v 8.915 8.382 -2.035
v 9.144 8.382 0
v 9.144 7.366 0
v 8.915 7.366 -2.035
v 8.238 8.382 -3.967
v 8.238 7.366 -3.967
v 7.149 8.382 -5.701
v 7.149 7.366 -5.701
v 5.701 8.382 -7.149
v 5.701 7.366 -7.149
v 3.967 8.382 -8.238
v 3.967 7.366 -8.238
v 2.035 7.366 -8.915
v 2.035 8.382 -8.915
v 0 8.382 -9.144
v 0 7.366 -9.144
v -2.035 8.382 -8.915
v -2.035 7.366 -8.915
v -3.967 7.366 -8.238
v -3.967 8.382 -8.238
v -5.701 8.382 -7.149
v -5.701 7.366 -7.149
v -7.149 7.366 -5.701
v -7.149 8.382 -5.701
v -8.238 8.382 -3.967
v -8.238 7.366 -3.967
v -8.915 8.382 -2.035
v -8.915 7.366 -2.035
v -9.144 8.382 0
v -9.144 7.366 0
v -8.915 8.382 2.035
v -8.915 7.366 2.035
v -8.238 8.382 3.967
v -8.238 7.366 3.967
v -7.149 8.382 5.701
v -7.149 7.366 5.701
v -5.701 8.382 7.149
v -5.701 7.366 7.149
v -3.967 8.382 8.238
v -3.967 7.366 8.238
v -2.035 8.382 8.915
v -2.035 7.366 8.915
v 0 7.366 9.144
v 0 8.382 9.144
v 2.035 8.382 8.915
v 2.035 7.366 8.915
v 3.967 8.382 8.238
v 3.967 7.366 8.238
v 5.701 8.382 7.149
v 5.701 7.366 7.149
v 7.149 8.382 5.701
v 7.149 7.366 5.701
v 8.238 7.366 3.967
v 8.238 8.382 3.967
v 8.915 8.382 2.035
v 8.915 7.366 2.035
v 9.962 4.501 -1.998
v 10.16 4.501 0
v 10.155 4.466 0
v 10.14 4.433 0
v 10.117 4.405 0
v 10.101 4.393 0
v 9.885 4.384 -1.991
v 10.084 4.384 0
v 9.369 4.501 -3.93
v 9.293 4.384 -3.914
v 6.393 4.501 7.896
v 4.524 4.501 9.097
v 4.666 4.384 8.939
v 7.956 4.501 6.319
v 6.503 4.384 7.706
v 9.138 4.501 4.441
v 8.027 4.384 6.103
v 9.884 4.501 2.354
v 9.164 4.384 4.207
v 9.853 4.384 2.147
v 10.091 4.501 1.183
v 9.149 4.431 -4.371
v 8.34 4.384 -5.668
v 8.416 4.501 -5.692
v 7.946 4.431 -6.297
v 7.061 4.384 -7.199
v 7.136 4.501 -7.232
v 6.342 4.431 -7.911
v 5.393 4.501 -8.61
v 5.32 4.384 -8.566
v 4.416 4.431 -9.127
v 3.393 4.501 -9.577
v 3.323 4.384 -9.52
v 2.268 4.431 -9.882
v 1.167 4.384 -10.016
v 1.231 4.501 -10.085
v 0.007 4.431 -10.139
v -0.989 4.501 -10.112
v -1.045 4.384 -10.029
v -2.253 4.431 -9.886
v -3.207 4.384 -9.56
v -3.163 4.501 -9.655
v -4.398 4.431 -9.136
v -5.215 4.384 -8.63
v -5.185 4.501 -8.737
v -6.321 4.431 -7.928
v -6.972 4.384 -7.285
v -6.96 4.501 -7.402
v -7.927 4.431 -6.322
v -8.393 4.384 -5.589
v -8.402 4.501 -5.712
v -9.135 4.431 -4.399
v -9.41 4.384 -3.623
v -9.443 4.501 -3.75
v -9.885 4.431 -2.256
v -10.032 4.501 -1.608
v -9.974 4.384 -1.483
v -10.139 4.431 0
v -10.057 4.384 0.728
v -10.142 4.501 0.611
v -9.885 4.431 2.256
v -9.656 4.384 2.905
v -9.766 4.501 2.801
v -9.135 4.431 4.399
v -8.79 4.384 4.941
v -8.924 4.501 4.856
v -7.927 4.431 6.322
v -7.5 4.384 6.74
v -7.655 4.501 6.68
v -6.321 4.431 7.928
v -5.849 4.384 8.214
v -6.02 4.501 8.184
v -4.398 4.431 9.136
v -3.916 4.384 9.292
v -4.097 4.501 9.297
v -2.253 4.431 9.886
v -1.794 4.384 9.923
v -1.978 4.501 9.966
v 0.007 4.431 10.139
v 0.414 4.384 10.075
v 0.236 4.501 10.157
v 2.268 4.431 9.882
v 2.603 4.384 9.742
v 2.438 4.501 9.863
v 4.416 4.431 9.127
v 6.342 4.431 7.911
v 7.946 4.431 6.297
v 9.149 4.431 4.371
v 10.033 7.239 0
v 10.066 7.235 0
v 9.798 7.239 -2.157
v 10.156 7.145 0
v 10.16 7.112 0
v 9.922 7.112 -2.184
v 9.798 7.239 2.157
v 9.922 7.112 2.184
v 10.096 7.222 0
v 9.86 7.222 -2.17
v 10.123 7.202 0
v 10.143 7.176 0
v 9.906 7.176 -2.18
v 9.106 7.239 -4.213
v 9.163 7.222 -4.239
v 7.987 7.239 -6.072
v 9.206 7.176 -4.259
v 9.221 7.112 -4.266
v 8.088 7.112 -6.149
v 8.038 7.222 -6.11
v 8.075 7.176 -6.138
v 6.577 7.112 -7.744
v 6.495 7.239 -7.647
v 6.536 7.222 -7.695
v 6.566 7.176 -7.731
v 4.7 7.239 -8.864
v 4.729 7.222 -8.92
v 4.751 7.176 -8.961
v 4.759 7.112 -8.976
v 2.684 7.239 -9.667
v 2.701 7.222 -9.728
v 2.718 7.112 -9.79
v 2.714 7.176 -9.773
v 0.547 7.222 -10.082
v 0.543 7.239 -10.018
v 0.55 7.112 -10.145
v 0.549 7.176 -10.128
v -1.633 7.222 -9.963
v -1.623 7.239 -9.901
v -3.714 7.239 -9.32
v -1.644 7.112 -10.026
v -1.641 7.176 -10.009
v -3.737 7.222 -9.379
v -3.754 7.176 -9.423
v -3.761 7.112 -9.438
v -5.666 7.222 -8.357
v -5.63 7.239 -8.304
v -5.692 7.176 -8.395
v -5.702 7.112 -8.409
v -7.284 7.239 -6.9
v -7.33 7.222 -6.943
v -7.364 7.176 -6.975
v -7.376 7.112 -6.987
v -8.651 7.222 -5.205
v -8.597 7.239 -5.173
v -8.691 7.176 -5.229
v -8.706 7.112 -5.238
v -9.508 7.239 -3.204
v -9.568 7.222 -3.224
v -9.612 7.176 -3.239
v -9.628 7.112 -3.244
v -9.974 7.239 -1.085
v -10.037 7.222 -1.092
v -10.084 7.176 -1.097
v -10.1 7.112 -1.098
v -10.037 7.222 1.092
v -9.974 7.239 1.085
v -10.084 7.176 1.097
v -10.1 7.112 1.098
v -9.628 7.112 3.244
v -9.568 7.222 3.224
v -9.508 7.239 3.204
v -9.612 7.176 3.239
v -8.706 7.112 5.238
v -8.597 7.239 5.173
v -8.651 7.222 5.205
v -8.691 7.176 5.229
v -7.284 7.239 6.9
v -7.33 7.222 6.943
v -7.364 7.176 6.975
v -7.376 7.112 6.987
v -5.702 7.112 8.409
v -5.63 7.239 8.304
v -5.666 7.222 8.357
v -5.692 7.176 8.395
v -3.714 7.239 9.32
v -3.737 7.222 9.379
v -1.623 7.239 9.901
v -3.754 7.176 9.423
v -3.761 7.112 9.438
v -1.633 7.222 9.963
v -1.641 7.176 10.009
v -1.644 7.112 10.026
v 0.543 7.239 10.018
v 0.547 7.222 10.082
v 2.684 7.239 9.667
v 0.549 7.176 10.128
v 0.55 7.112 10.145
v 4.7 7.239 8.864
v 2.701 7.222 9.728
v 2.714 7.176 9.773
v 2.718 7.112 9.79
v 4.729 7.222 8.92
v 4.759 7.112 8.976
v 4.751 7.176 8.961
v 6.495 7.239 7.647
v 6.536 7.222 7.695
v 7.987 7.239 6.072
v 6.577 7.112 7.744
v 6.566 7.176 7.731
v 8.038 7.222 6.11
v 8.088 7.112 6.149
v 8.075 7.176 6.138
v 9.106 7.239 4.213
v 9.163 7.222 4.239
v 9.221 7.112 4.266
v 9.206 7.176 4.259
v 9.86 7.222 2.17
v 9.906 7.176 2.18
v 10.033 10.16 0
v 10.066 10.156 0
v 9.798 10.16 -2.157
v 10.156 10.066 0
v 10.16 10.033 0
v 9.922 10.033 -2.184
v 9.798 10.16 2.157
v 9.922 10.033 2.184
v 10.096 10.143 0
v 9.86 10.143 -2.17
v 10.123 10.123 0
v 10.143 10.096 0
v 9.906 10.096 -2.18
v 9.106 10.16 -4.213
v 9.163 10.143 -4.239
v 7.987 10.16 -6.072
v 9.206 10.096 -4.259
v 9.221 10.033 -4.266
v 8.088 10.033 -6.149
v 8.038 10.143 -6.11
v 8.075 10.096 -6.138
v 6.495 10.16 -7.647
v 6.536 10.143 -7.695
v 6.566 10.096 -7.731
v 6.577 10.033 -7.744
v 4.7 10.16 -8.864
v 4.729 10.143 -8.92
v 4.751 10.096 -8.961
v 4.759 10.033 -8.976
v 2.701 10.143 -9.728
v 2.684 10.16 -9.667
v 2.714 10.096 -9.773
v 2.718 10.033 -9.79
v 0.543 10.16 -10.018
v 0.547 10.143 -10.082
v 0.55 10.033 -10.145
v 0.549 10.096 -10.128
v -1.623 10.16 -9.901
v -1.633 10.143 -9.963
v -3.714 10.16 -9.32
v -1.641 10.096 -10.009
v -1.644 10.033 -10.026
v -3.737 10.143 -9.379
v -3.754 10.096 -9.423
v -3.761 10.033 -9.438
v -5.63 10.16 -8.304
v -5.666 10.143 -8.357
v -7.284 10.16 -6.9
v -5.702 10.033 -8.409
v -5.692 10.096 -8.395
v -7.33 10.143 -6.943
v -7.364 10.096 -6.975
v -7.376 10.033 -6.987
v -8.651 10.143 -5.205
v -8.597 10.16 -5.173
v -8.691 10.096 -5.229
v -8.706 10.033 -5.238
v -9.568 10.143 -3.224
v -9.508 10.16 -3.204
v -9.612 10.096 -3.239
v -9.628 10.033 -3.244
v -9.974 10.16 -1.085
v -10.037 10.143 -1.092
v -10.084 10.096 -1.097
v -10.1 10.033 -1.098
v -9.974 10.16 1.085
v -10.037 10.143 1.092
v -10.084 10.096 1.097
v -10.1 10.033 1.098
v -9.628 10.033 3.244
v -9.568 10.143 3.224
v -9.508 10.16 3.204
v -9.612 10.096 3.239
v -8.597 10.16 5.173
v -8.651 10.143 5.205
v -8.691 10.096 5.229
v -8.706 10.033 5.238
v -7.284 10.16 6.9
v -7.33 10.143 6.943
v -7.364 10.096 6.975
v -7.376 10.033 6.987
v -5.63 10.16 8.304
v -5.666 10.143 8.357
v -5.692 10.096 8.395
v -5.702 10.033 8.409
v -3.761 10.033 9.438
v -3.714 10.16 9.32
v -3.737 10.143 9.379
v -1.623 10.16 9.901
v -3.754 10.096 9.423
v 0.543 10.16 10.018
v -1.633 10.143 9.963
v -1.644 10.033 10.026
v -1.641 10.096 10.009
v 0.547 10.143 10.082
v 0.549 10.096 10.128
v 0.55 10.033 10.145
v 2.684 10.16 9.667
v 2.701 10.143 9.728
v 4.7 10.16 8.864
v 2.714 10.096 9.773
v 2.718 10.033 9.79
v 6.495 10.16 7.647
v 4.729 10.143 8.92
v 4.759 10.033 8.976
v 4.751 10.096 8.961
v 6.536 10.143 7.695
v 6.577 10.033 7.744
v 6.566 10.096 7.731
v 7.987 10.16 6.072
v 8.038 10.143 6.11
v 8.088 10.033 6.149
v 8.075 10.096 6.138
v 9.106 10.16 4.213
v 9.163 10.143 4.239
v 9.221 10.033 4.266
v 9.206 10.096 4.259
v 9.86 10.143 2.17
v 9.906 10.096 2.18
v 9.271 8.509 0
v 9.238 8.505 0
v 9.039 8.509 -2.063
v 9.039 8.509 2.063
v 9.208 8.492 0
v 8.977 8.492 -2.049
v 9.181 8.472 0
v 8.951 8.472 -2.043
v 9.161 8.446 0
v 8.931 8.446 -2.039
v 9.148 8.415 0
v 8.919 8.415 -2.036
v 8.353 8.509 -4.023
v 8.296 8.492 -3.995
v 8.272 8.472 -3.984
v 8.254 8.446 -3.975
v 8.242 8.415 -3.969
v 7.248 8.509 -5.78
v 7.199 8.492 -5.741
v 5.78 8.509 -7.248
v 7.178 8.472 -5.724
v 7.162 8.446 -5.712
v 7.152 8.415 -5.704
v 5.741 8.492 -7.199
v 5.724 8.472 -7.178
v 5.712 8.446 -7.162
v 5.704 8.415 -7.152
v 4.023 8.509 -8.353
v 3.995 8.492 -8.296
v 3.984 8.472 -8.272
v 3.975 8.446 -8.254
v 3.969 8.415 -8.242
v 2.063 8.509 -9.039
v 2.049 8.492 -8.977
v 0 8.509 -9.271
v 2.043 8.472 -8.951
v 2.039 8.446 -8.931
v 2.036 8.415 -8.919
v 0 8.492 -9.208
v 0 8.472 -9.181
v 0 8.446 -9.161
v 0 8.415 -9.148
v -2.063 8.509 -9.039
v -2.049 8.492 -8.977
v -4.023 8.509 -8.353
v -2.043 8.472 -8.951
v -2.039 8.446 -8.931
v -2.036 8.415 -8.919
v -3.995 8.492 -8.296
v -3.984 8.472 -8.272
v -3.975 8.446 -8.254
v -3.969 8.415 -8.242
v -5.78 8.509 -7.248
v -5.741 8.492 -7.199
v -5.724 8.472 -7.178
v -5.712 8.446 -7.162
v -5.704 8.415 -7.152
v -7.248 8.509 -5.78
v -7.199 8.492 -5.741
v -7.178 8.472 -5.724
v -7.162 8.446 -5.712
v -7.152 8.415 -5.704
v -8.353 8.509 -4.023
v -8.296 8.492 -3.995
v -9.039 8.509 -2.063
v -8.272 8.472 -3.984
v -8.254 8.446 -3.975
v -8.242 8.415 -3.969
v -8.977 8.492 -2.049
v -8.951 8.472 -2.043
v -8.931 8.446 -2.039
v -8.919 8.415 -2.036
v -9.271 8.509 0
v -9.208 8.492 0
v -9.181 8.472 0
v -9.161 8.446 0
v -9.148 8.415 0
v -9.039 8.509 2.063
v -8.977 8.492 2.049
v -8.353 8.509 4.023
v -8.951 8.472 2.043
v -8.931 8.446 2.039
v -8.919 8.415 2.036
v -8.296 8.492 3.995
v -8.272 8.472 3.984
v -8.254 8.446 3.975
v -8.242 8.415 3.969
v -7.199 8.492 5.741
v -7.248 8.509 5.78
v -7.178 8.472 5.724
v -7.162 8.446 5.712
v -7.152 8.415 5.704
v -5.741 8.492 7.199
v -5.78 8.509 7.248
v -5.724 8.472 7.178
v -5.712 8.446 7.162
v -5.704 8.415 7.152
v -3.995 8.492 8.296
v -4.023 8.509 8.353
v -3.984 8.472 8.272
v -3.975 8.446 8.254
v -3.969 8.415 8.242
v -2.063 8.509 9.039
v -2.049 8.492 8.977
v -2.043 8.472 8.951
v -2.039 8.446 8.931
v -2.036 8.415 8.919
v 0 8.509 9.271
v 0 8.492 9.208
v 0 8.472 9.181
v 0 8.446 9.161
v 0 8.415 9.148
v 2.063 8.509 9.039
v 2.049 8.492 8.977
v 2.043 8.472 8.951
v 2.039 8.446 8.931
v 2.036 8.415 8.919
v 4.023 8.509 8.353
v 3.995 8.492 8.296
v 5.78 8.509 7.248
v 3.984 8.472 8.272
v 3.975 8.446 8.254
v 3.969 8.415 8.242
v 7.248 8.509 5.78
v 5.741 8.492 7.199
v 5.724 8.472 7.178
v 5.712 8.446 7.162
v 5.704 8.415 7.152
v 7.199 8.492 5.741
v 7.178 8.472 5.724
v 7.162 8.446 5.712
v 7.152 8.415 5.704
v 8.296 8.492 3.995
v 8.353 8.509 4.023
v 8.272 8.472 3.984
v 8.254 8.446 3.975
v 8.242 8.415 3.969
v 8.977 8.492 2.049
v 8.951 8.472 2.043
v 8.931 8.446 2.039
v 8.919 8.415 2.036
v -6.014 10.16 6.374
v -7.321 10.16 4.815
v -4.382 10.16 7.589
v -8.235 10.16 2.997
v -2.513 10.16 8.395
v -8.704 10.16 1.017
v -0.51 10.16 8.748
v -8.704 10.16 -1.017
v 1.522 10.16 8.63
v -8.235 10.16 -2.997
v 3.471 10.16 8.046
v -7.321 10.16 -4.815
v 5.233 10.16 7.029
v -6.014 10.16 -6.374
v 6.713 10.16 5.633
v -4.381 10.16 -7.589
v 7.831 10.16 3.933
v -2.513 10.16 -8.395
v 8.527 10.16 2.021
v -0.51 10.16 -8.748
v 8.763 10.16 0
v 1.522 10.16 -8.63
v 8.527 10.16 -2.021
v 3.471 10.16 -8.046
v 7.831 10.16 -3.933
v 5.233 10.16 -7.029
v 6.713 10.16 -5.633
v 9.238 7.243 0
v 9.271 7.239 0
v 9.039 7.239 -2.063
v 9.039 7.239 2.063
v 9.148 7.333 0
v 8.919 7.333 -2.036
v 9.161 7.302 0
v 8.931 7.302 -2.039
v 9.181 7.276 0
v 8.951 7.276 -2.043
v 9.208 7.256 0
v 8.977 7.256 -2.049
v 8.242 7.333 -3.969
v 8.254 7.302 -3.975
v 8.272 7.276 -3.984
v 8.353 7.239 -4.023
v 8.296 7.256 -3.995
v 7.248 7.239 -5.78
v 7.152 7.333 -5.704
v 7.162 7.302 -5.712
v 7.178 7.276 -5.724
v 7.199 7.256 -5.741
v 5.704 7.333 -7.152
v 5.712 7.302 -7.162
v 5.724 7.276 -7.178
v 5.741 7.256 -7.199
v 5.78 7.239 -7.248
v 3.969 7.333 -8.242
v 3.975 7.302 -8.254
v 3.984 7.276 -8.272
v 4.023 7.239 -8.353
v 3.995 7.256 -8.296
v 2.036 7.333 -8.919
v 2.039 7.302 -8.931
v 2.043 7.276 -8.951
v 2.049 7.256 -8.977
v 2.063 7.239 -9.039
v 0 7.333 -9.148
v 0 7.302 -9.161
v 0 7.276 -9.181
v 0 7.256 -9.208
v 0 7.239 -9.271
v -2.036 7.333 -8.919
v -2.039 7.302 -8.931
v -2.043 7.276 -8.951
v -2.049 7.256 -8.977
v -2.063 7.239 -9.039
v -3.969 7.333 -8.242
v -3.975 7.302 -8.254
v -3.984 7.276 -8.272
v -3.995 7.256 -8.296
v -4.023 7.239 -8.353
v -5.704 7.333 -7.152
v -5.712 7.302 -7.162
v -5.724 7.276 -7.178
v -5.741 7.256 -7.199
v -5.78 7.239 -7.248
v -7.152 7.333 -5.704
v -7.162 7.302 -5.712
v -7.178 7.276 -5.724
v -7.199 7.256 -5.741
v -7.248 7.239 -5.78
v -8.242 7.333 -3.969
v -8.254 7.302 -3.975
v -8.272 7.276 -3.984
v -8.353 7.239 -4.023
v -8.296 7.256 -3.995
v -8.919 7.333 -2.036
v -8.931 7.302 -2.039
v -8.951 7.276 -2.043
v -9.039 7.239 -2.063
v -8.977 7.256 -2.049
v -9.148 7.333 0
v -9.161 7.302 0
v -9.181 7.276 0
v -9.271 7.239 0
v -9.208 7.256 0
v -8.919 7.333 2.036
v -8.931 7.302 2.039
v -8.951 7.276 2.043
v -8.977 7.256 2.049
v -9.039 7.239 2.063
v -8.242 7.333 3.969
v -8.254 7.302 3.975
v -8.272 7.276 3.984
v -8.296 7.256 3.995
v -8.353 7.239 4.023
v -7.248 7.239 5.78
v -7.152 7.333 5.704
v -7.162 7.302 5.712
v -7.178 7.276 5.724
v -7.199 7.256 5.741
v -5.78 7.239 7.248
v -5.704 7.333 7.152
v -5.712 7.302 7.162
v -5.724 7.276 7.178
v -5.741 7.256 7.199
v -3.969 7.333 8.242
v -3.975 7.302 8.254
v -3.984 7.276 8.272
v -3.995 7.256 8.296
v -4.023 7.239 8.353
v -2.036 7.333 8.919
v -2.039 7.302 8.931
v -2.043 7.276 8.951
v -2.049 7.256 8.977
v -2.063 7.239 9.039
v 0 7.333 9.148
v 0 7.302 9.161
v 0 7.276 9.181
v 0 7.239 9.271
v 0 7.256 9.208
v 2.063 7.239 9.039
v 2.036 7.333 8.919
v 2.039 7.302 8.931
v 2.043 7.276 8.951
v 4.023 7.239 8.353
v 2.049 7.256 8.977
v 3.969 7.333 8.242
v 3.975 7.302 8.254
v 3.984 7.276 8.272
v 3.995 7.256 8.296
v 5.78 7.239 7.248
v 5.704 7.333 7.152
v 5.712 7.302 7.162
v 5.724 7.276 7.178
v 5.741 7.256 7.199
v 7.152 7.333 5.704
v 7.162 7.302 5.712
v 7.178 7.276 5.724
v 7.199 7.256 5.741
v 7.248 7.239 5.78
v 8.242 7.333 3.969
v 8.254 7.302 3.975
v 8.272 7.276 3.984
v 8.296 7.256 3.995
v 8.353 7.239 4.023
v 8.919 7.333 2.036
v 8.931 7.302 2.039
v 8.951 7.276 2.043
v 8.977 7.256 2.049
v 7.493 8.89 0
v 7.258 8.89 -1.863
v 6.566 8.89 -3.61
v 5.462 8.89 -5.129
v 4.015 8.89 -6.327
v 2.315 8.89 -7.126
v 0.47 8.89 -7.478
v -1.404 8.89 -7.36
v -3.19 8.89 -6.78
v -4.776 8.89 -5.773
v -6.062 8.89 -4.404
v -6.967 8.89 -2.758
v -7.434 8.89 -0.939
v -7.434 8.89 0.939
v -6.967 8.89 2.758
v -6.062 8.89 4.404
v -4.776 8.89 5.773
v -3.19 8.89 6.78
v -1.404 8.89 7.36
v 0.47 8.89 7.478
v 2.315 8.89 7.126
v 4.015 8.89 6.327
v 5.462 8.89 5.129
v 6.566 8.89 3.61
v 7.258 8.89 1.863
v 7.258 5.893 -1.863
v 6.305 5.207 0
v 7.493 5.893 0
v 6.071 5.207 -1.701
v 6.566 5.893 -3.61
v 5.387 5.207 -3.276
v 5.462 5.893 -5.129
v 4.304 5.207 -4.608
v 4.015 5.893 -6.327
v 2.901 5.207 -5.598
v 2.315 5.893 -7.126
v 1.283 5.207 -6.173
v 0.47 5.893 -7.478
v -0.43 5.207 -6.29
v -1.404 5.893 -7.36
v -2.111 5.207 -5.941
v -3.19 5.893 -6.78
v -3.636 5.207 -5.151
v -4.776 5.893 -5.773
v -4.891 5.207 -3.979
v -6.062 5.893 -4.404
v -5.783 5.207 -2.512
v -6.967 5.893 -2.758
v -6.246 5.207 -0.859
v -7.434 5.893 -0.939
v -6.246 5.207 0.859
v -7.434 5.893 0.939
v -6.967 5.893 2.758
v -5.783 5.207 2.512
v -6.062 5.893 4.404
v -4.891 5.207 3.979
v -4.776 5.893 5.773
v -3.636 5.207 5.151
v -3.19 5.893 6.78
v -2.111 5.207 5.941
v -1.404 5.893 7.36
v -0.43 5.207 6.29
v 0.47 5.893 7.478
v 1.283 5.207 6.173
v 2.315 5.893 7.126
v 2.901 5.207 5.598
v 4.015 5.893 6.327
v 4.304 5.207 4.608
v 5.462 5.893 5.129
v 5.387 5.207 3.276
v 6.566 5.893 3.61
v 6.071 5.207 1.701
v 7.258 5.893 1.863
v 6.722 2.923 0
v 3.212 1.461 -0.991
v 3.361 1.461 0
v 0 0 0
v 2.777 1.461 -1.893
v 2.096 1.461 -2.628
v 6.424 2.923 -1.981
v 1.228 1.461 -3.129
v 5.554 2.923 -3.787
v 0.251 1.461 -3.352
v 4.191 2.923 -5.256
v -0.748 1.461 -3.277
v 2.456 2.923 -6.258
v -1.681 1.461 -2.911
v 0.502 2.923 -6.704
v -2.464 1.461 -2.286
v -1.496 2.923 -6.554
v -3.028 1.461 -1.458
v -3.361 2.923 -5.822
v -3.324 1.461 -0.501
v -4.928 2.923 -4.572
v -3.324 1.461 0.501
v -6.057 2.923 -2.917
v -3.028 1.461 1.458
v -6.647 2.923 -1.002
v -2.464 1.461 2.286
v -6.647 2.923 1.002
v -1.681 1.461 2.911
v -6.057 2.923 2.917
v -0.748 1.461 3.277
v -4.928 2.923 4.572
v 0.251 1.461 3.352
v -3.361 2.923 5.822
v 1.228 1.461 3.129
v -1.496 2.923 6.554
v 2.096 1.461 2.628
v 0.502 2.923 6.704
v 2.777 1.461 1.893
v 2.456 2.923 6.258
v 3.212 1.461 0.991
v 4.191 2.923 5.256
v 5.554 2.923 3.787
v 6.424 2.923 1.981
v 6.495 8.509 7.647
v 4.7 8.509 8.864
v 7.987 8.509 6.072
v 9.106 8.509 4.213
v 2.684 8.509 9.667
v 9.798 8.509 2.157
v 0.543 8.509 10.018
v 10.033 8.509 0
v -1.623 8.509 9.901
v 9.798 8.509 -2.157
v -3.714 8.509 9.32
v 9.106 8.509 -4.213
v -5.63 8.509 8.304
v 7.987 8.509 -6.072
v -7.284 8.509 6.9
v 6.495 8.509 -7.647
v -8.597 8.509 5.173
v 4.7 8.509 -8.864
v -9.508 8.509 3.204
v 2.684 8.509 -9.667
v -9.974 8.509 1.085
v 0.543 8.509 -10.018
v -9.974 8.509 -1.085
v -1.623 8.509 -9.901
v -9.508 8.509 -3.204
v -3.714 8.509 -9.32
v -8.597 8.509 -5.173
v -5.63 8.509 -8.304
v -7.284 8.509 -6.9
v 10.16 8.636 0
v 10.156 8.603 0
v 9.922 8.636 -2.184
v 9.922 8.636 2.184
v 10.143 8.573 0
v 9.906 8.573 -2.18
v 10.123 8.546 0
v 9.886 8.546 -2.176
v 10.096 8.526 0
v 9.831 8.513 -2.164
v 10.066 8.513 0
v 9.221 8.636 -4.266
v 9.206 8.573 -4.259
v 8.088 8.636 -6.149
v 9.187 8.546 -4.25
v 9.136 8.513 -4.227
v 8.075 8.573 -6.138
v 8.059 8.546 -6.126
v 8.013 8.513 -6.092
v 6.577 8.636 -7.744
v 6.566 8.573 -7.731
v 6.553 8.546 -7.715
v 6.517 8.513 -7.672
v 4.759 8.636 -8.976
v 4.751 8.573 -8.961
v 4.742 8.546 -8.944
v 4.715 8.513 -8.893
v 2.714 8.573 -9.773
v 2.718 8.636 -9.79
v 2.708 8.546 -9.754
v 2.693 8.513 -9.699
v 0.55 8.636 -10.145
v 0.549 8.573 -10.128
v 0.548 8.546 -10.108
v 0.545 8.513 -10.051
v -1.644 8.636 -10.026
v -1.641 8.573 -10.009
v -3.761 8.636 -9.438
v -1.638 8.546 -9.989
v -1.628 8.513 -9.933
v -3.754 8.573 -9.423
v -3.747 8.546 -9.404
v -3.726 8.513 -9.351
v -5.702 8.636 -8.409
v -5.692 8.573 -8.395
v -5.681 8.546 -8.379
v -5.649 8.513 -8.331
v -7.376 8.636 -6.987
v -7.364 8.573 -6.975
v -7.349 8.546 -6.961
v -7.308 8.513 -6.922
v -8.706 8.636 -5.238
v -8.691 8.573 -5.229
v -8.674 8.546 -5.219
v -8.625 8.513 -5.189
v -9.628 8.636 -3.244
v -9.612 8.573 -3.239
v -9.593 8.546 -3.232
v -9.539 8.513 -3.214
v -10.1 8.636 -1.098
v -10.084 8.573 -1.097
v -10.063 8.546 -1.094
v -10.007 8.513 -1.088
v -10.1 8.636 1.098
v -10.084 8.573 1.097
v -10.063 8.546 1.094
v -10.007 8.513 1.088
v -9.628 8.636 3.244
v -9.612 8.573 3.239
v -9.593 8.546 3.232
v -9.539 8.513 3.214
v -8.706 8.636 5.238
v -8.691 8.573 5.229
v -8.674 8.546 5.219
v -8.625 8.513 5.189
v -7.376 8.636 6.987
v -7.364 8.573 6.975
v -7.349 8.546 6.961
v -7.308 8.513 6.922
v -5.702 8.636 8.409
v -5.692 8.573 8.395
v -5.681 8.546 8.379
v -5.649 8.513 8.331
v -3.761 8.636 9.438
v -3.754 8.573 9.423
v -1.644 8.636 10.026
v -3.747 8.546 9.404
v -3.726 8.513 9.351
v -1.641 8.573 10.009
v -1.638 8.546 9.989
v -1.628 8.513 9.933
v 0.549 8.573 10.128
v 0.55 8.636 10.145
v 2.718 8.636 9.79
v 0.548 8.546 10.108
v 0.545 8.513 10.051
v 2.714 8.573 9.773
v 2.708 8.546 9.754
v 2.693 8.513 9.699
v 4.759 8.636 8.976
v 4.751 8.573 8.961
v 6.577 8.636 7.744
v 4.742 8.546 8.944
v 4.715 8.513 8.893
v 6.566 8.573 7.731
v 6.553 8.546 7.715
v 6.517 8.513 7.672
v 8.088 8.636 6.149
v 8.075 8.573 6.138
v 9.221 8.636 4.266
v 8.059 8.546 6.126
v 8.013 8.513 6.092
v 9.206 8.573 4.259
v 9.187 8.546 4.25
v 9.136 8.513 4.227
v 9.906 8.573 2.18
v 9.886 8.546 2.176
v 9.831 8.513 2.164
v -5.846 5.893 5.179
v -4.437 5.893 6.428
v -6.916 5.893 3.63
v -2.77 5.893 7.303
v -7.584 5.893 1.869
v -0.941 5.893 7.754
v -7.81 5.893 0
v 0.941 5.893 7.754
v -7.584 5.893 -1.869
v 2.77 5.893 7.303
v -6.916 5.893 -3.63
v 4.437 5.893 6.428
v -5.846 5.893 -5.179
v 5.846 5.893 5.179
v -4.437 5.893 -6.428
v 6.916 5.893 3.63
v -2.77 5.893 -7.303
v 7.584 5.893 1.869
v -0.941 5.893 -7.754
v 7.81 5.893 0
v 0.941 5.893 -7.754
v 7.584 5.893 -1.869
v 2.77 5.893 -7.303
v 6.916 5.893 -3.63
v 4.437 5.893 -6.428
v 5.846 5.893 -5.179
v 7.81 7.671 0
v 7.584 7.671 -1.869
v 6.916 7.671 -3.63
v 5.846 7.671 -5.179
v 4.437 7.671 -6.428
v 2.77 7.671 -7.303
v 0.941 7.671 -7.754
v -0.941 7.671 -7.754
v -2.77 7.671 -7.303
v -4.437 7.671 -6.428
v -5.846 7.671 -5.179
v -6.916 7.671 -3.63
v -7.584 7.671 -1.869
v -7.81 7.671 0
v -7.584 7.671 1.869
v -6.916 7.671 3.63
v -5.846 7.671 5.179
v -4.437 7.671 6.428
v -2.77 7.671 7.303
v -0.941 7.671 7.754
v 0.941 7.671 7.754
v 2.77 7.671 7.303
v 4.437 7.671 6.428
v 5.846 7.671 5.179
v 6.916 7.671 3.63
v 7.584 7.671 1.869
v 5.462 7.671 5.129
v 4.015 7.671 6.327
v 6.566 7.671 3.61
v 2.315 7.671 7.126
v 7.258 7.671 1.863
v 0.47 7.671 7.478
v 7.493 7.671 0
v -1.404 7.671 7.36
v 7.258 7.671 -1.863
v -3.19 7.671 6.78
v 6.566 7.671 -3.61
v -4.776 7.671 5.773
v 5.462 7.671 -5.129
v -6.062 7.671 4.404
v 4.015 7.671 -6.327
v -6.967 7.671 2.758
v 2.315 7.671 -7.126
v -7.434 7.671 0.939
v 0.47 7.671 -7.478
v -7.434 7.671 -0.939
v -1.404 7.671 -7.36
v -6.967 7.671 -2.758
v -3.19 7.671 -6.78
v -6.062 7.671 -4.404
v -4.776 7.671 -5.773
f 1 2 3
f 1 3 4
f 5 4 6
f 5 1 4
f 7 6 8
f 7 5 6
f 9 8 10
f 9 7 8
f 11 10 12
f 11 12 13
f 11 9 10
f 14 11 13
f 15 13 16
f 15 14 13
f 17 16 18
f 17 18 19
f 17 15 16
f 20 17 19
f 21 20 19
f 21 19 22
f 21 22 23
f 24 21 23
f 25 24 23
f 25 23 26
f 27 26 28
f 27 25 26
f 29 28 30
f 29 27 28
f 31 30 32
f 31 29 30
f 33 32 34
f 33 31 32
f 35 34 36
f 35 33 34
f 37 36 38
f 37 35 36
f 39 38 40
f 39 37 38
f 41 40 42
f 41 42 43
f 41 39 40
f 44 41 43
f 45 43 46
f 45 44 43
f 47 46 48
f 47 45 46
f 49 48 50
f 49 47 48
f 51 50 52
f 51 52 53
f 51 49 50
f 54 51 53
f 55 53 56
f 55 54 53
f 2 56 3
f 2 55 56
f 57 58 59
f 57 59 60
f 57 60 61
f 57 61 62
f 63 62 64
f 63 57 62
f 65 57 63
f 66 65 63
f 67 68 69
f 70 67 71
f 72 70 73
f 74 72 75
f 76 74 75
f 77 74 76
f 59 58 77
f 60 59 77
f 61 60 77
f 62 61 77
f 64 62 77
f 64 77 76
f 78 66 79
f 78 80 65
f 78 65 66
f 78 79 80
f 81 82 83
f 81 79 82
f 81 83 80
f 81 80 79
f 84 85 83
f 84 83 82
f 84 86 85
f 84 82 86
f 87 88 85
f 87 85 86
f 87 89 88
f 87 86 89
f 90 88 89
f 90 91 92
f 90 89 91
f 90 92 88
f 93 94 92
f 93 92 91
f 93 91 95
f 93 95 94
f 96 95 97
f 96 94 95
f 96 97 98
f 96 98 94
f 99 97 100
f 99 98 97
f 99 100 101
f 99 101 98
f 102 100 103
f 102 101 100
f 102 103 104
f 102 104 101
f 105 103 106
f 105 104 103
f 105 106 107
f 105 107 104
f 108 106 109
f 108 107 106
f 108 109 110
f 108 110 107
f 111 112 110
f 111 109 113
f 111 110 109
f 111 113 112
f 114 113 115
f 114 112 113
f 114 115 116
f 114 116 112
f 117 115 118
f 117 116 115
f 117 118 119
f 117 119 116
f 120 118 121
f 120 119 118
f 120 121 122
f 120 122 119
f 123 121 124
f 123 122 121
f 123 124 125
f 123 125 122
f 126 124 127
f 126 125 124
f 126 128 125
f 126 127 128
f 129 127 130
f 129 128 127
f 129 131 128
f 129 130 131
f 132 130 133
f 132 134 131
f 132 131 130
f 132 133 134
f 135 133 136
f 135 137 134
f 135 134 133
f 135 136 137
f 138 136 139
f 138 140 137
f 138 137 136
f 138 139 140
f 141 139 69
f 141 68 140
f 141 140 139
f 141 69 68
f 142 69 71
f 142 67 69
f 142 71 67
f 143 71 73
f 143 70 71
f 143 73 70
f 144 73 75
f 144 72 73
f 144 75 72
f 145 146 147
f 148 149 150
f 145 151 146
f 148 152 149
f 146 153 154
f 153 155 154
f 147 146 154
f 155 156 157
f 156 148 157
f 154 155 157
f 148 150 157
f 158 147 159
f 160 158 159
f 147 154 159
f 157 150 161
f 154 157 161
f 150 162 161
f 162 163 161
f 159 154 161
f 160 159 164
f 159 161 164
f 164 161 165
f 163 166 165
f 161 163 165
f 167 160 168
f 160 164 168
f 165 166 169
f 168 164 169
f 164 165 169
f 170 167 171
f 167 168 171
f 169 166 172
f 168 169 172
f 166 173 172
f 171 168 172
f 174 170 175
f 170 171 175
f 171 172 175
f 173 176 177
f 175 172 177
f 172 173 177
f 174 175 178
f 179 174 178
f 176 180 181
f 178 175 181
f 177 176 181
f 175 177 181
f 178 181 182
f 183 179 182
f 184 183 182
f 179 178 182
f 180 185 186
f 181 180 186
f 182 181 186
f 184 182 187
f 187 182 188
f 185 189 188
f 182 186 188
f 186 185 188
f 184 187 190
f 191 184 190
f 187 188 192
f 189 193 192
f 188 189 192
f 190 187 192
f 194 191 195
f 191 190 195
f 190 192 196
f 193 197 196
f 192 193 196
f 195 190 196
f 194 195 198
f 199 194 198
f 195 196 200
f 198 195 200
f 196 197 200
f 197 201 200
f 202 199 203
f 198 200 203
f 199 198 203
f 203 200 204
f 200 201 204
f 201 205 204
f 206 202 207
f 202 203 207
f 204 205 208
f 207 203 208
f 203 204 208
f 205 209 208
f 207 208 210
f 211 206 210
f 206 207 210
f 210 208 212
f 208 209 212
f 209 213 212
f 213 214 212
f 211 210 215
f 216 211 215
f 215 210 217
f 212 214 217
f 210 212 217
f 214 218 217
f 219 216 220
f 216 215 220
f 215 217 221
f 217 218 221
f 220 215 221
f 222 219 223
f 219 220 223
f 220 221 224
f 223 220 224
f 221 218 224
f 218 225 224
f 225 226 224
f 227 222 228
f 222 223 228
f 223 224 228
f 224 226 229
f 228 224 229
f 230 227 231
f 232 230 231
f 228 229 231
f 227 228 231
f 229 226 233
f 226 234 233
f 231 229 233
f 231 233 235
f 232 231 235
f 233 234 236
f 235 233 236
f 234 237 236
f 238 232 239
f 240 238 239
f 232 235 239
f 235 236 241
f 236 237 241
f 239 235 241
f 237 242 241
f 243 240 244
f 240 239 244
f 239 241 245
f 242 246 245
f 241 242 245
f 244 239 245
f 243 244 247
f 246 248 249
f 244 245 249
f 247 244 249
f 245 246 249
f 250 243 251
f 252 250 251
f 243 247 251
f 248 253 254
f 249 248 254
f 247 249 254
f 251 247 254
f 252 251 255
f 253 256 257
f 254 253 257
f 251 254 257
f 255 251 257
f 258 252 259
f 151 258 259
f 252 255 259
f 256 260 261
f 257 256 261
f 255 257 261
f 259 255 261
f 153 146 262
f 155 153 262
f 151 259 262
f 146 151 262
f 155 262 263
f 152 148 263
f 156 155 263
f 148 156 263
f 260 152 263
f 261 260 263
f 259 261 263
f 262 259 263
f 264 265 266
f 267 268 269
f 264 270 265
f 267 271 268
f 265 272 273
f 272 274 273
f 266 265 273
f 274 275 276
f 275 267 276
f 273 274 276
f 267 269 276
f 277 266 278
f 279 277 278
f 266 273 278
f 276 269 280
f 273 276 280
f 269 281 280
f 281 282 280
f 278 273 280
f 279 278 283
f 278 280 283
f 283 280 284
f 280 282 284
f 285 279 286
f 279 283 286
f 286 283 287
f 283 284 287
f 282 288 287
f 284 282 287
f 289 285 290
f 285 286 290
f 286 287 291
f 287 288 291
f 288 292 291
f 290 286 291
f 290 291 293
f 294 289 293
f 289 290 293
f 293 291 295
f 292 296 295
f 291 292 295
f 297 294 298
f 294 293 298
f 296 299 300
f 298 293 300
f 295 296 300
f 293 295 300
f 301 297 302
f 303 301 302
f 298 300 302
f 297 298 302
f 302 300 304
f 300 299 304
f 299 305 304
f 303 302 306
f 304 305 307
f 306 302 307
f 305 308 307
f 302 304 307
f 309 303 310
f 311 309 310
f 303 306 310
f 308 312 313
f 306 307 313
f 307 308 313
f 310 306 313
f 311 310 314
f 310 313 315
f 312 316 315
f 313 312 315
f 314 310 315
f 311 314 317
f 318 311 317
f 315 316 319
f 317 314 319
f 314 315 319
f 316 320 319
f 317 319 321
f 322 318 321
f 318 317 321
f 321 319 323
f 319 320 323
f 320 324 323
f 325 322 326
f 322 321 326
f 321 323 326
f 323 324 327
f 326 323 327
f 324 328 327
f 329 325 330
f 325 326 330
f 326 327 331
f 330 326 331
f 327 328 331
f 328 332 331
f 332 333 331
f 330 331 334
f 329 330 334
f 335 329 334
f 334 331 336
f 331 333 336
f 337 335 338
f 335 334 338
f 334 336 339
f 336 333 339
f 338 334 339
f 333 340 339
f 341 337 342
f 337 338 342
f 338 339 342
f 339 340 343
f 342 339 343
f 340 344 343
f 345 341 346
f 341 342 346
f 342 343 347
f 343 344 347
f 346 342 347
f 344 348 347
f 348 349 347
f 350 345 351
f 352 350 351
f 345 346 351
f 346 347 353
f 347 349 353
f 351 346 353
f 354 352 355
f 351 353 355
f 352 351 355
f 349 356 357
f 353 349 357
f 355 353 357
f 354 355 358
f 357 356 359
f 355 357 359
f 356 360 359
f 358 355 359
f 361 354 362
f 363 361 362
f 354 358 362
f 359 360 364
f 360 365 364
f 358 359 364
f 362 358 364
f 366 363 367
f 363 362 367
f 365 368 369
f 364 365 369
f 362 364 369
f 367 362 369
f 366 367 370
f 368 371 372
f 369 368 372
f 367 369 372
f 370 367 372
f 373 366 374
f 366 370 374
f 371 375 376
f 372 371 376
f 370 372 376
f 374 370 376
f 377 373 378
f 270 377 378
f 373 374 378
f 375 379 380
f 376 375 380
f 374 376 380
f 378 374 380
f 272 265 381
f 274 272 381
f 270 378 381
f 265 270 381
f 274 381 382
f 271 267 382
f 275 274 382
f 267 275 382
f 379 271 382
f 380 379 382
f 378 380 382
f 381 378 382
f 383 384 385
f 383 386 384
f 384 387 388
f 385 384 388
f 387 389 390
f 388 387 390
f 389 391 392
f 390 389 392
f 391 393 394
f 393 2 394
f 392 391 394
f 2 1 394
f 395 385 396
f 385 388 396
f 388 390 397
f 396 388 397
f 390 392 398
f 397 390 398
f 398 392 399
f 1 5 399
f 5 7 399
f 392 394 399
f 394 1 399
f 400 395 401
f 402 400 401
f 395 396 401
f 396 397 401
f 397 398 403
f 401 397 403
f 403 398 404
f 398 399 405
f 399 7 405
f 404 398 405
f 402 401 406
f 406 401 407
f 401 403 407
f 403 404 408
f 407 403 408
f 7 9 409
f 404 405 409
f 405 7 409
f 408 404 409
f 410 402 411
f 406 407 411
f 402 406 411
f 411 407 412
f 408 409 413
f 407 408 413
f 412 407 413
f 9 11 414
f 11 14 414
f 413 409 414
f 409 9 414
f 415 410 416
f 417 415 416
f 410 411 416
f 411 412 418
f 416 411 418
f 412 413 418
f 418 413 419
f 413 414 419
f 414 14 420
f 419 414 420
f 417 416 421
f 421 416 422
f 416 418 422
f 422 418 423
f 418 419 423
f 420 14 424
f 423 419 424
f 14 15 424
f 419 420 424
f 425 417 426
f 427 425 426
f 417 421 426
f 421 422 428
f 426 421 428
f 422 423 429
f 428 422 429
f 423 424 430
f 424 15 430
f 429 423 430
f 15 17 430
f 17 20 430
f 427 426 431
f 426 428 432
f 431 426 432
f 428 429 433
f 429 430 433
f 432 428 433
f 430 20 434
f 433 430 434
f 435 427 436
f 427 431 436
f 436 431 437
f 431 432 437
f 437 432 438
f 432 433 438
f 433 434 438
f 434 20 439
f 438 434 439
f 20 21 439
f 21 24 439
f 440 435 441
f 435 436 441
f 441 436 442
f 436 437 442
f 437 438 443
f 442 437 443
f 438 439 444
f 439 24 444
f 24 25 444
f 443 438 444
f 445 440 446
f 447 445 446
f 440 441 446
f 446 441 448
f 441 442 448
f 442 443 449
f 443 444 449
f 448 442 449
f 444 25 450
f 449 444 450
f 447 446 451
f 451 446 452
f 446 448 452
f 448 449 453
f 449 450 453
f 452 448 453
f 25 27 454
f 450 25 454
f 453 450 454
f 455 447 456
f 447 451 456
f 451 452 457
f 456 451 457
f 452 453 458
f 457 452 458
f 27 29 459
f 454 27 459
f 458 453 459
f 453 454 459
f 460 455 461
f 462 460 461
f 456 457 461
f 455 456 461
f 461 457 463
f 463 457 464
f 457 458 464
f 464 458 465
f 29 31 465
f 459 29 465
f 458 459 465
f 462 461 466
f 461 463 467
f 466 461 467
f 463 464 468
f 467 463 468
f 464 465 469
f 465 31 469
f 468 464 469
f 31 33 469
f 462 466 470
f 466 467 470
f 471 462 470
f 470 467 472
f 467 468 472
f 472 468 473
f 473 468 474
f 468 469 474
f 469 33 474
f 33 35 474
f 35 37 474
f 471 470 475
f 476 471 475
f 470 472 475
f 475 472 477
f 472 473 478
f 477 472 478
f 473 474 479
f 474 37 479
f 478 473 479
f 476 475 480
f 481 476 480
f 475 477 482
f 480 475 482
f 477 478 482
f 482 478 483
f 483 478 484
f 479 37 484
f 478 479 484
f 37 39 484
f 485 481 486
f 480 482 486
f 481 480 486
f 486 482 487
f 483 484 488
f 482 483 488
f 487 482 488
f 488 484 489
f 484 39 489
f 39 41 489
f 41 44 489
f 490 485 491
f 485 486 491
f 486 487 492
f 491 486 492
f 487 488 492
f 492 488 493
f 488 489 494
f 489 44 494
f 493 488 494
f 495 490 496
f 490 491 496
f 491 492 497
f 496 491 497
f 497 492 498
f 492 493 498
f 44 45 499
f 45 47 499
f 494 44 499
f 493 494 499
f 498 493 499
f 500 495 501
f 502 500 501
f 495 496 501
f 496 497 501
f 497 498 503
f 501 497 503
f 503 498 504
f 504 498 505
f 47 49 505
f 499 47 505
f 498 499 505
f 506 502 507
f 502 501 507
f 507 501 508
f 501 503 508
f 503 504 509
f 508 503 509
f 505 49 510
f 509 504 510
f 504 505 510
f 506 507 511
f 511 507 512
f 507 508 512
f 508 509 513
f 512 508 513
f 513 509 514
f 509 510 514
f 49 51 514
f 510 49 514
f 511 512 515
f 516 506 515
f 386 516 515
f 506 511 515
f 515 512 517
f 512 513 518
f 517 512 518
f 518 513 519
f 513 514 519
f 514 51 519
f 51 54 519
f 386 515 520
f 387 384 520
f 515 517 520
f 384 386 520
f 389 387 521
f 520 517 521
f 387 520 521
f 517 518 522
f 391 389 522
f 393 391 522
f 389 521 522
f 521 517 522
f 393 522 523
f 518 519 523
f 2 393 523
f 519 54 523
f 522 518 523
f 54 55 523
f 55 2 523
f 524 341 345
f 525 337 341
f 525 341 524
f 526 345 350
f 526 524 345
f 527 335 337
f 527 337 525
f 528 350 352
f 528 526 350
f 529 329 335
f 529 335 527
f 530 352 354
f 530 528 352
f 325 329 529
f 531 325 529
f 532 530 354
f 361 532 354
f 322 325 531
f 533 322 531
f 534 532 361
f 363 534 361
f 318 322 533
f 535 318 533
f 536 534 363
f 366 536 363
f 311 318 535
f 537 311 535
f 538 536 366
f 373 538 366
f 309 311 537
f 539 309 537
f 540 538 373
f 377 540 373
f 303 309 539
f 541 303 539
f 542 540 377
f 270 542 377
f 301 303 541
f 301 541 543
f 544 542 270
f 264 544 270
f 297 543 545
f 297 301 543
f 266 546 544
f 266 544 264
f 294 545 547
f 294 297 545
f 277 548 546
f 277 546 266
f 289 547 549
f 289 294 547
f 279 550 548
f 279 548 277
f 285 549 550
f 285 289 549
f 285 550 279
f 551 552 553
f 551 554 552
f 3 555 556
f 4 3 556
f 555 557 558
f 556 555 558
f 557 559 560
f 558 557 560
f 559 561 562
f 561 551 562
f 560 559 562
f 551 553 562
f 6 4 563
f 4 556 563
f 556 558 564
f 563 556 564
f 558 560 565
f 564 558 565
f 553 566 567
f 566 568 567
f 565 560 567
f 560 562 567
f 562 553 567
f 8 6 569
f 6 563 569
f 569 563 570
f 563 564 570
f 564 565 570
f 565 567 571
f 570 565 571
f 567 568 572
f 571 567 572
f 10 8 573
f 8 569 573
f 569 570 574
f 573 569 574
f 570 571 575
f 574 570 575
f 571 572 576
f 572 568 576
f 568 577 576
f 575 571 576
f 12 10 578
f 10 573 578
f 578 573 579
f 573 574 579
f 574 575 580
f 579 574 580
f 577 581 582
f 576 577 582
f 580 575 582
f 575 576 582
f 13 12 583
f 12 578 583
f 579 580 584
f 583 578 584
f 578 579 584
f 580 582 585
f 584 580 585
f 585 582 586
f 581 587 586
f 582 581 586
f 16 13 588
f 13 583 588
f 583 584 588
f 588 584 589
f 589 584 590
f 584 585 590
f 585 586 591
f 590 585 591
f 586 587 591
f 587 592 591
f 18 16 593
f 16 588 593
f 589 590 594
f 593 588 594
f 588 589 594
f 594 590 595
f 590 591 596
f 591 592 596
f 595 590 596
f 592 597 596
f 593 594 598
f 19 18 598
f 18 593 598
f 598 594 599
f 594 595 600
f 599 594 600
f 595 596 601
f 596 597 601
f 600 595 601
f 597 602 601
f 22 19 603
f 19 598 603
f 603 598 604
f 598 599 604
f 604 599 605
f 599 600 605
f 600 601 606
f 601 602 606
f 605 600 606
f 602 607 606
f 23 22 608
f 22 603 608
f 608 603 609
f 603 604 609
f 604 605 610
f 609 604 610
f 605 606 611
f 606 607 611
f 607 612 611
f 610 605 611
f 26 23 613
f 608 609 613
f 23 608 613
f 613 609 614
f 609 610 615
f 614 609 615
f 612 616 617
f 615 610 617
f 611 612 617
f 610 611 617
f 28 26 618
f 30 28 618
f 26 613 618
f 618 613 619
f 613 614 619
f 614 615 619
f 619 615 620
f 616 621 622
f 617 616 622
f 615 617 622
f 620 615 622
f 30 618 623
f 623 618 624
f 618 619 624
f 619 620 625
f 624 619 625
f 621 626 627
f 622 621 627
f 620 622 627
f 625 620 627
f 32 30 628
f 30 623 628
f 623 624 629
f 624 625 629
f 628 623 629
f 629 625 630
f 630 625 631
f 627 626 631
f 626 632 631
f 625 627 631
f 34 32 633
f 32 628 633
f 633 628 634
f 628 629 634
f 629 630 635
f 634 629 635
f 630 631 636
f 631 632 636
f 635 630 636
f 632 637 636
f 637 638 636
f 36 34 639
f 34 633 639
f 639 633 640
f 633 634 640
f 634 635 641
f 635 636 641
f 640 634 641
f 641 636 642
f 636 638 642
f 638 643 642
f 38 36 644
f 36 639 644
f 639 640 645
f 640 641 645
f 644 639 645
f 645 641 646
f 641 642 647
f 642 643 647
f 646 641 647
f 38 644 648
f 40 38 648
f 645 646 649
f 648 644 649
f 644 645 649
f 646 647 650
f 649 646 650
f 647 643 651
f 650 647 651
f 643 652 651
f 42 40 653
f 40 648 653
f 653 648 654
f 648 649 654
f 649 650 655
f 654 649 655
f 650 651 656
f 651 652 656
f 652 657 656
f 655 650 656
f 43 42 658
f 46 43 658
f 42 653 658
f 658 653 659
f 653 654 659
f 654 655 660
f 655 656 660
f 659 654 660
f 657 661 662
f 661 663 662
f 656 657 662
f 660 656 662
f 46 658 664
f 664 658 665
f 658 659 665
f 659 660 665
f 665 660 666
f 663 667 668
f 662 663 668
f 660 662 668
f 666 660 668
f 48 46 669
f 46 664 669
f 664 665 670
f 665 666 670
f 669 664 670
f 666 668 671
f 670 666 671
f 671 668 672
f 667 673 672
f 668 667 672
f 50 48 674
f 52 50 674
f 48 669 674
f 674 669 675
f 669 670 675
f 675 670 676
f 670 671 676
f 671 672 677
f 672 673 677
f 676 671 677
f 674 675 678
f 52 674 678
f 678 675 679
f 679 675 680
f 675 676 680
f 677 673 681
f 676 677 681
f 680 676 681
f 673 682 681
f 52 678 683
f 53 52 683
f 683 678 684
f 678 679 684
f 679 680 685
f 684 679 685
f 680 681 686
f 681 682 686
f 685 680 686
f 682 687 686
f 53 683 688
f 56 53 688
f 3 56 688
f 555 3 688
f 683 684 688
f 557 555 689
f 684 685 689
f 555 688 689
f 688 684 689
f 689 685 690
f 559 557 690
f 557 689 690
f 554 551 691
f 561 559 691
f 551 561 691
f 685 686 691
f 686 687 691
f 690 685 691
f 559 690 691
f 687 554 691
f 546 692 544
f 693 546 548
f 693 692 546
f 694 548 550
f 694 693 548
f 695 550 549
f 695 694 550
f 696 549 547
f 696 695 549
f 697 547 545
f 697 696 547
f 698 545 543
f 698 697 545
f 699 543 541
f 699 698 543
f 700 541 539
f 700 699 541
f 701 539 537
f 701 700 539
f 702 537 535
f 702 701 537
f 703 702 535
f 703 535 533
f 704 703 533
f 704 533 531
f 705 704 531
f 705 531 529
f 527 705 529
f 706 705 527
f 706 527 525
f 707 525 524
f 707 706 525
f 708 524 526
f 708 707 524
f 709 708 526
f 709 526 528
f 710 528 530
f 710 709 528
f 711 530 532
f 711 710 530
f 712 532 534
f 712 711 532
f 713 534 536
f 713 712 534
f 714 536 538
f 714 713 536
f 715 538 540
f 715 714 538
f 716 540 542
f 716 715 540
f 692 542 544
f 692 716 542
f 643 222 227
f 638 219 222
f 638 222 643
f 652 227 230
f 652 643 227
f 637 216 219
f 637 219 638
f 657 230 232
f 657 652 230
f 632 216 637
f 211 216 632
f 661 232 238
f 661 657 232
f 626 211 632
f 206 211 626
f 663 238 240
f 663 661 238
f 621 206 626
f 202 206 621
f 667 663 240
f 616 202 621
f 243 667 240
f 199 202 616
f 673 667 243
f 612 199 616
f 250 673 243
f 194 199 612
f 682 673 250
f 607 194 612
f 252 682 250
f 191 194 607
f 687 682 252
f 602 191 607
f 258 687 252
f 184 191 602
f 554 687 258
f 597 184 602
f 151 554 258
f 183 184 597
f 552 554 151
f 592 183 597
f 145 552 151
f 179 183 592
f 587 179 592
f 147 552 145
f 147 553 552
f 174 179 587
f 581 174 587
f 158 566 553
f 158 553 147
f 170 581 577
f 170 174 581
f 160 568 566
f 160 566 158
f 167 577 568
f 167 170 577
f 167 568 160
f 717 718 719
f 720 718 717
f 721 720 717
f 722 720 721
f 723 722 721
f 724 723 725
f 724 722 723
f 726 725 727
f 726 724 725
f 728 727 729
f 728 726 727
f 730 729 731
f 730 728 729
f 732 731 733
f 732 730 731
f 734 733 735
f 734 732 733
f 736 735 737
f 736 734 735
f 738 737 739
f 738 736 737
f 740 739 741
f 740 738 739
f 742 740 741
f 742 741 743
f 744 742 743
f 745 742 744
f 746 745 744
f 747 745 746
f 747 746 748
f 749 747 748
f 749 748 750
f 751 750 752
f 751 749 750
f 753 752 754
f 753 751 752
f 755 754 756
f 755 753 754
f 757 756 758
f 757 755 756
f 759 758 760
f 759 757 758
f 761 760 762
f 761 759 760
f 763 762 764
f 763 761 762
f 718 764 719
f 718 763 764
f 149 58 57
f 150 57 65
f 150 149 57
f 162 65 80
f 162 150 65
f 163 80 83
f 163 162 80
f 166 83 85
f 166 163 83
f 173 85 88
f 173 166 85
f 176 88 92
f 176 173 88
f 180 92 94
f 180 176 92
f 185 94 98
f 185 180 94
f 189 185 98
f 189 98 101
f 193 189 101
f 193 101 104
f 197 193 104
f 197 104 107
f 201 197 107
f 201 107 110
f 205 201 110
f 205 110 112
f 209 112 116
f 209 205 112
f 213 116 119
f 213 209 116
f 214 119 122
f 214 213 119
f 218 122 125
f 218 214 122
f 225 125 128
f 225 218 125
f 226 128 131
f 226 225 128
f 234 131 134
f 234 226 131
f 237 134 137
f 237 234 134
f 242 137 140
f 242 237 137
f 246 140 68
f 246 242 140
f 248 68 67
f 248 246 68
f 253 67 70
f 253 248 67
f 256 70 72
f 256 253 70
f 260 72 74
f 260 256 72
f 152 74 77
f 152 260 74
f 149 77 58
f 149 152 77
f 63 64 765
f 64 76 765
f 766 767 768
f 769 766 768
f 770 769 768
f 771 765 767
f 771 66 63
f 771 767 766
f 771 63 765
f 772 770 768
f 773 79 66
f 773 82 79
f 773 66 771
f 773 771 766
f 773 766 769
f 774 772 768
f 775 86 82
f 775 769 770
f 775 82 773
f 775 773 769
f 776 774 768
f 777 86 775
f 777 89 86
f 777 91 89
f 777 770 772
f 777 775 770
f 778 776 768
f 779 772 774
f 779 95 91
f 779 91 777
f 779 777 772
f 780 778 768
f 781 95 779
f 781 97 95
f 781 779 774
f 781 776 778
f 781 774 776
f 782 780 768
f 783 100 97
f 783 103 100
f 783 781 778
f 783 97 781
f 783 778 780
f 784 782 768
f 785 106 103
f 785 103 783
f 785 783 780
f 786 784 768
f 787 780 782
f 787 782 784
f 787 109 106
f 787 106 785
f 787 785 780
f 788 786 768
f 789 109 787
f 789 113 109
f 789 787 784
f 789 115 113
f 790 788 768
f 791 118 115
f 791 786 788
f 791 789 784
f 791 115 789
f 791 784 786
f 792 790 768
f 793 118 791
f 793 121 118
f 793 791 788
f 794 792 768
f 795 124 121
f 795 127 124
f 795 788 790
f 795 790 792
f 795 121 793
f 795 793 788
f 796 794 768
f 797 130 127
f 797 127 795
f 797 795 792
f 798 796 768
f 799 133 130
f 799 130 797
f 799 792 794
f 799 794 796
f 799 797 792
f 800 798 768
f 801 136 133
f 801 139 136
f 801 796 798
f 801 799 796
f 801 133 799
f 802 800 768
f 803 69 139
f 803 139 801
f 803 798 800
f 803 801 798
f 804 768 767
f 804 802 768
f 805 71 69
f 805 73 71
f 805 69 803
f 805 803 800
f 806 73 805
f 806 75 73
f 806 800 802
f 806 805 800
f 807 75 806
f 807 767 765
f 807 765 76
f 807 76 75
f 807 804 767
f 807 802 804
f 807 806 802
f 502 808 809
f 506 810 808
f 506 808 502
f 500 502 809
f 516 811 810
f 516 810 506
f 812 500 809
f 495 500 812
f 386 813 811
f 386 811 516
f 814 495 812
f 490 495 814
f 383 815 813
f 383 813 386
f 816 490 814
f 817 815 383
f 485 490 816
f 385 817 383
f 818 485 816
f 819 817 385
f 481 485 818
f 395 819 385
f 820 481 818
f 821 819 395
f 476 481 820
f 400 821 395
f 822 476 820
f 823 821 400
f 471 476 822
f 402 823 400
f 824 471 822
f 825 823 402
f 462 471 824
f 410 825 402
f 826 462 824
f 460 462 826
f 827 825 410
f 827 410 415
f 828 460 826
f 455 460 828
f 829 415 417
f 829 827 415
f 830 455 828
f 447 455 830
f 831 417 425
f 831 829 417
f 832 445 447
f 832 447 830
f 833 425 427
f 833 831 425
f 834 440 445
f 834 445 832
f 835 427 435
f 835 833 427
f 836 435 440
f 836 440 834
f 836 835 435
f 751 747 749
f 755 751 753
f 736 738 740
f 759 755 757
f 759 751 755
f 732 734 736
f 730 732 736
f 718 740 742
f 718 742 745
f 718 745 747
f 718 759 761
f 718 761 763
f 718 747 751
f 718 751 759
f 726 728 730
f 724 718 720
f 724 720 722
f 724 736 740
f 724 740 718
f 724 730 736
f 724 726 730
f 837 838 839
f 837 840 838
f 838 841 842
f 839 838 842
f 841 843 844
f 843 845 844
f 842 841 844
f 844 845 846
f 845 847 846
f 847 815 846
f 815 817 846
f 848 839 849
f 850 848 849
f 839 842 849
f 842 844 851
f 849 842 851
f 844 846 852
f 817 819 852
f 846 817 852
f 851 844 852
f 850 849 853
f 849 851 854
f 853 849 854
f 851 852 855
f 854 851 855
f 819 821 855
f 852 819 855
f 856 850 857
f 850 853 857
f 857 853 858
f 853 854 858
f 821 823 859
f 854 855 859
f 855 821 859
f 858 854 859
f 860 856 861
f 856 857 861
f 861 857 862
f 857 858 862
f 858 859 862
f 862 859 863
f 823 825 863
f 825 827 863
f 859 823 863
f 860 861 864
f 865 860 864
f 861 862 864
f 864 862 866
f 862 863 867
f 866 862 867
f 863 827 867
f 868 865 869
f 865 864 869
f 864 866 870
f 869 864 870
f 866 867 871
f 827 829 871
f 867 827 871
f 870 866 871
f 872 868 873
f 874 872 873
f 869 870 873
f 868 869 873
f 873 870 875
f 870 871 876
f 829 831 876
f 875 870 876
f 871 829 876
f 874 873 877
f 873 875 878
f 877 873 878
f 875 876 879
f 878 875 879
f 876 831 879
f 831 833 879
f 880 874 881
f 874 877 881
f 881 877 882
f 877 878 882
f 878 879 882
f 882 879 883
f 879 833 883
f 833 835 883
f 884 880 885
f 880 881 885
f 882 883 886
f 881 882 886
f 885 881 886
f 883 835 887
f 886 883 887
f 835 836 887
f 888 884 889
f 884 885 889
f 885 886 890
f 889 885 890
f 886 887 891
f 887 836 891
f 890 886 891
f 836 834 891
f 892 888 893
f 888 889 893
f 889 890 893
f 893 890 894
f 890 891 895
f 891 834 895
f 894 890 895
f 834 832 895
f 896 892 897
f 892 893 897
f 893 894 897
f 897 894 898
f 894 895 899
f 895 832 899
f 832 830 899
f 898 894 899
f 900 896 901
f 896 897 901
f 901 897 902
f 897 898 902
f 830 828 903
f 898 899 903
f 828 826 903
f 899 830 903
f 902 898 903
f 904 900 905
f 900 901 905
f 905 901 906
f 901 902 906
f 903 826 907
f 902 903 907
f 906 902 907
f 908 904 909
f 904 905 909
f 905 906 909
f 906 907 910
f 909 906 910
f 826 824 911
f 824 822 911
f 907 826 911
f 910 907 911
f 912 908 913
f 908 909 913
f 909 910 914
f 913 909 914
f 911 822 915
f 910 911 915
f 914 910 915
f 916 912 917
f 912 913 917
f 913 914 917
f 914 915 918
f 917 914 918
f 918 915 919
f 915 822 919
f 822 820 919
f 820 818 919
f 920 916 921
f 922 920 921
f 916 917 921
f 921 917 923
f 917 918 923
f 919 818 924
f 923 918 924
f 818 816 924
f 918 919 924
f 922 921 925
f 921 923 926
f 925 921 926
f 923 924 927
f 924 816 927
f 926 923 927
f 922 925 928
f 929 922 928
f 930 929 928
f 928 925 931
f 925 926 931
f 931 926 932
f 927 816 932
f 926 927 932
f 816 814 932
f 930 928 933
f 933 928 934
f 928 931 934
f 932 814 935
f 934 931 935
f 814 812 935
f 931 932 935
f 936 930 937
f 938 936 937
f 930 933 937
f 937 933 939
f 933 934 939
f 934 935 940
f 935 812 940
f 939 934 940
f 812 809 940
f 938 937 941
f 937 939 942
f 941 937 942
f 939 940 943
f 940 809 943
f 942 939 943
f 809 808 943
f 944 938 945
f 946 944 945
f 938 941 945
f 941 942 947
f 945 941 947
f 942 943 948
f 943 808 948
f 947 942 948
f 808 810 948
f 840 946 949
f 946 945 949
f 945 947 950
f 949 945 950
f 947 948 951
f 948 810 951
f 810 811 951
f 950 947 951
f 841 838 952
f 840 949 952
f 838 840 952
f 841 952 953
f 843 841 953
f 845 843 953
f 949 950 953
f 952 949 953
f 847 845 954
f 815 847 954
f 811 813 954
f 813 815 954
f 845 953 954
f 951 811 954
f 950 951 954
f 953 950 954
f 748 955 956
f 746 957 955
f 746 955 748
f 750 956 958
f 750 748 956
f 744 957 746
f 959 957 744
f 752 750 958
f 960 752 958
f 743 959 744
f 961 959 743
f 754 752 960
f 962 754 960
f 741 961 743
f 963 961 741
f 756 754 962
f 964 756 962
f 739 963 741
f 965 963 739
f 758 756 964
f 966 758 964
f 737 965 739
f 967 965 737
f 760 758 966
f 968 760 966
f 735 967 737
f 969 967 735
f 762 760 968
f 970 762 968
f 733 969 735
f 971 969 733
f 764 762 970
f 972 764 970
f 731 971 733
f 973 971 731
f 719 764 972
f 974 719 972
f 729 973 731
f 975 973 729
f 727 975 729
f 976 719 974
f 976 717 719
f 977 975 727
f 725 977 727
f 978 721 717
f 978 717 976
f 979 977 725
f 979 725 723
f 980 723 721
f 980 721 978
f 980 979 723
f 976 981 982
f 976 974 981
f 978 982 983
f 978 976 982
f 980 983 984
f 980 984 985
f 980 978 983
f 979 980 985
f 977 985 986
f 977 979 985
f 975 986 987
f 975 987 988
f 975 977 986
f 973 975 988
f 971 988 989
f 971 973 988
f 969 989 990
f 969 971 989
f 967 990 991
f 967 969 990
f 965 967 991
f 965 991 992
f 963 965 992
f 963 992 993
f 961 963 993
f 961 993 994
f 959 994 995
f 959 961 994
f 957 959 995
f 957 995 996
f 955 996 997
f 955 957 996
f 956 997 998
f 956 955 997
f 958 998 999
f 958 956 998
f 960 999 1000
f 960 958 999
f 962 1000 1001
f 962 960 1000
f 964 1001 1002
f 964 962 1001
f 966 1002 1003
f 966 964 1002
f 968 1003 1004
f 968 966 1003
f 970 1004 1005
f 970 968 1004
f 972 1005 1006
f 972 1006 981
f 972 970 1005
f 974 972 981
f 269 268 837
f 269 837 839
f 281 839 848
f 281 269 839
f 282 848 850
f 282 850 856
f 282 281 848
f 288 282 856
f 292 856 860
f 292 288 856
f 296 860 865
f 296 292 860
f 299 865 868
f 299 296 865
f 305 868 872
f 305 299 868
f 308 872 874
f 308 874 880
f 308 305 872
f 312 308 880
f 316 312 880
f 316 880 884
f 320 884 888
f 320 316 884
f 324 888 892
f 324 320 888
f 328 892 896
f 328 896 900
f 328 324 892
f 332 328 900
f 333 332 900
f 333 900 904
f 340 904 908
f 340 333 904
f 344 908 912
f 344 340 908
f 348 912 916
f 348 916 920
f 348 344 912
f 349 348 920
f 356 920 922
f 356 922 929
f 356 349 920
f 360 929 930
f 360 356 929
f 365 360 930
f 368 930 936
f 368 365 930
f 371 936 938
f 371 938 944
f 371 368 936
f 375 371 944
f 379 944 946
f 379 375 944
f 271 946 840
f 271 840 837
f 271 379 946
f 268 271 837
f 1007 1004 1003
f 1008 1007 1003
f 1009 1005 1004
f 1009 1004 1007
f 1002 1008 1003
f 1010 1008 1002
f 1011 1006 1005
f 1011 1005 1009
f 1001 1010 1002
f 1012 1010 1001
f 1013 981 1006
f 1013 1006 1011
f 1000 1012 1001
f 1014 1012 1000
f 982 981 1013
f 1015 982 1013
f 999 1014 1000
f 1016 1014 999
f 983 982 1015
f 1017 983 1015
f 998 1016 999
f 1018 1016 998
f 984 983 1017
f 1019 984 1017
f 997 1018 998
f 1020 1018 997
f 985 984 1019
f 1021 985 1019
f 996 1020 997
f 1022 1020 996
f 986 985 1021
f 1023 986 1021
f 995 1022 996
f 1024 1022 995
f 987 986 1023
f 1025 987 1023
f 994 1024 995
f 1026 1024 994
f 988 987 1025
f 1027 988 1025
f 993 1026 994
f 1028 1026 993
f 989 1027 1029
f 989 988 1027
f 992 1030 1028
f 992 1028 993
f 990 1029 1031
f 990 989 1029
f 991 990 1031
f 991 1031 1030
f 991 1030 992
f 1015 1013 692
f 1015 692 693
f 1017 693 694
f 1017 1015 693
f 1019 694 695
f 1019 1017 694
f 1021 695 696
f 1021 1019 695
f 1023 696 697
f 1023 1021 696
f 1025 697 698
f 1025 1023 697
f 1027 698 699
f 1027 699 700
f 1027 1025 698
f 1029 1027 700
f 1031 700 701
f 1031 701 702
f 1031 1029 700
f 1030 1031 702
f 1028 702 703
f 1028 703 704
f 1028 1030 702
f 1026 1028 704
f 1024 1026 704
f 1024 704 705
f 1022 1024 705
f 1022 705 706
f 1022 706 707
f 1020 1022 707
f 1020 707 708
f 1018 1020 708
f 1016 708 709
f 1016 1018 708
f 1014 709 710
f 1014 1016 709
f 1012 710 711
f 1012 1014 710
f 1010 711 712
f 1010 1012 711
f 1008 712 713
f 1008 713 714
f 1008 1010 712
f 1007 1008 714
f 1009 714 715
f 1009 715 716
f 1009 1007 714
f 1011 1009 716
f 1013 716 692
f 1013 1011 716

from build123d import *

# Parameters (mm, degrees)
CHAMFER1_SIZE = 1.27
FILLET1_R     = 0.127


with BuildPart() as part:
    # Sketch1 → Revolve1 (revolve)
    with BuildSketch(Plane.XY):
        Polygon((0, 0), (10.16, 4.417391304), (10.16, 7.239), (9.144, 7.239), (9.144, 8.509), (10.16, 8.509), (10.16, 10.16), (7.493, 10.16), (7.493, 7.6708), (7.8105, 7.6708), (7.8105, 5.8928), (7.493, 5.8928), (6.305159556, 5.207), (0, 5.207), align=None)
    revolve(axis=Axis((0, 0, 0), (0, 1, 0)))

    # Chamfer1
    chamfer1_edges = [part.edges().sort_by_distance(p)[0] for p in [
        (-7.493, 10.16, 0),
    ]]
    chamfer(chamfer1_edges, length=CHAMFER1_SIZE)

    # Fillet1
    fillet1_edges = [part.edges().sort_by_distance(p)[0] for p in [
        (-10.16, 10.16, 0),
        (-10.16, 8.509, 0),
        (-9.144, 8.509, 0),
        (-9.144, 7.239, 0),
        (-10.16, 7.239, 0),
        (-10.16, 4.417391304, 0),
    ]]
    fillet(fillet1_edges, radius=FILLET1_R)


solid = part.part
